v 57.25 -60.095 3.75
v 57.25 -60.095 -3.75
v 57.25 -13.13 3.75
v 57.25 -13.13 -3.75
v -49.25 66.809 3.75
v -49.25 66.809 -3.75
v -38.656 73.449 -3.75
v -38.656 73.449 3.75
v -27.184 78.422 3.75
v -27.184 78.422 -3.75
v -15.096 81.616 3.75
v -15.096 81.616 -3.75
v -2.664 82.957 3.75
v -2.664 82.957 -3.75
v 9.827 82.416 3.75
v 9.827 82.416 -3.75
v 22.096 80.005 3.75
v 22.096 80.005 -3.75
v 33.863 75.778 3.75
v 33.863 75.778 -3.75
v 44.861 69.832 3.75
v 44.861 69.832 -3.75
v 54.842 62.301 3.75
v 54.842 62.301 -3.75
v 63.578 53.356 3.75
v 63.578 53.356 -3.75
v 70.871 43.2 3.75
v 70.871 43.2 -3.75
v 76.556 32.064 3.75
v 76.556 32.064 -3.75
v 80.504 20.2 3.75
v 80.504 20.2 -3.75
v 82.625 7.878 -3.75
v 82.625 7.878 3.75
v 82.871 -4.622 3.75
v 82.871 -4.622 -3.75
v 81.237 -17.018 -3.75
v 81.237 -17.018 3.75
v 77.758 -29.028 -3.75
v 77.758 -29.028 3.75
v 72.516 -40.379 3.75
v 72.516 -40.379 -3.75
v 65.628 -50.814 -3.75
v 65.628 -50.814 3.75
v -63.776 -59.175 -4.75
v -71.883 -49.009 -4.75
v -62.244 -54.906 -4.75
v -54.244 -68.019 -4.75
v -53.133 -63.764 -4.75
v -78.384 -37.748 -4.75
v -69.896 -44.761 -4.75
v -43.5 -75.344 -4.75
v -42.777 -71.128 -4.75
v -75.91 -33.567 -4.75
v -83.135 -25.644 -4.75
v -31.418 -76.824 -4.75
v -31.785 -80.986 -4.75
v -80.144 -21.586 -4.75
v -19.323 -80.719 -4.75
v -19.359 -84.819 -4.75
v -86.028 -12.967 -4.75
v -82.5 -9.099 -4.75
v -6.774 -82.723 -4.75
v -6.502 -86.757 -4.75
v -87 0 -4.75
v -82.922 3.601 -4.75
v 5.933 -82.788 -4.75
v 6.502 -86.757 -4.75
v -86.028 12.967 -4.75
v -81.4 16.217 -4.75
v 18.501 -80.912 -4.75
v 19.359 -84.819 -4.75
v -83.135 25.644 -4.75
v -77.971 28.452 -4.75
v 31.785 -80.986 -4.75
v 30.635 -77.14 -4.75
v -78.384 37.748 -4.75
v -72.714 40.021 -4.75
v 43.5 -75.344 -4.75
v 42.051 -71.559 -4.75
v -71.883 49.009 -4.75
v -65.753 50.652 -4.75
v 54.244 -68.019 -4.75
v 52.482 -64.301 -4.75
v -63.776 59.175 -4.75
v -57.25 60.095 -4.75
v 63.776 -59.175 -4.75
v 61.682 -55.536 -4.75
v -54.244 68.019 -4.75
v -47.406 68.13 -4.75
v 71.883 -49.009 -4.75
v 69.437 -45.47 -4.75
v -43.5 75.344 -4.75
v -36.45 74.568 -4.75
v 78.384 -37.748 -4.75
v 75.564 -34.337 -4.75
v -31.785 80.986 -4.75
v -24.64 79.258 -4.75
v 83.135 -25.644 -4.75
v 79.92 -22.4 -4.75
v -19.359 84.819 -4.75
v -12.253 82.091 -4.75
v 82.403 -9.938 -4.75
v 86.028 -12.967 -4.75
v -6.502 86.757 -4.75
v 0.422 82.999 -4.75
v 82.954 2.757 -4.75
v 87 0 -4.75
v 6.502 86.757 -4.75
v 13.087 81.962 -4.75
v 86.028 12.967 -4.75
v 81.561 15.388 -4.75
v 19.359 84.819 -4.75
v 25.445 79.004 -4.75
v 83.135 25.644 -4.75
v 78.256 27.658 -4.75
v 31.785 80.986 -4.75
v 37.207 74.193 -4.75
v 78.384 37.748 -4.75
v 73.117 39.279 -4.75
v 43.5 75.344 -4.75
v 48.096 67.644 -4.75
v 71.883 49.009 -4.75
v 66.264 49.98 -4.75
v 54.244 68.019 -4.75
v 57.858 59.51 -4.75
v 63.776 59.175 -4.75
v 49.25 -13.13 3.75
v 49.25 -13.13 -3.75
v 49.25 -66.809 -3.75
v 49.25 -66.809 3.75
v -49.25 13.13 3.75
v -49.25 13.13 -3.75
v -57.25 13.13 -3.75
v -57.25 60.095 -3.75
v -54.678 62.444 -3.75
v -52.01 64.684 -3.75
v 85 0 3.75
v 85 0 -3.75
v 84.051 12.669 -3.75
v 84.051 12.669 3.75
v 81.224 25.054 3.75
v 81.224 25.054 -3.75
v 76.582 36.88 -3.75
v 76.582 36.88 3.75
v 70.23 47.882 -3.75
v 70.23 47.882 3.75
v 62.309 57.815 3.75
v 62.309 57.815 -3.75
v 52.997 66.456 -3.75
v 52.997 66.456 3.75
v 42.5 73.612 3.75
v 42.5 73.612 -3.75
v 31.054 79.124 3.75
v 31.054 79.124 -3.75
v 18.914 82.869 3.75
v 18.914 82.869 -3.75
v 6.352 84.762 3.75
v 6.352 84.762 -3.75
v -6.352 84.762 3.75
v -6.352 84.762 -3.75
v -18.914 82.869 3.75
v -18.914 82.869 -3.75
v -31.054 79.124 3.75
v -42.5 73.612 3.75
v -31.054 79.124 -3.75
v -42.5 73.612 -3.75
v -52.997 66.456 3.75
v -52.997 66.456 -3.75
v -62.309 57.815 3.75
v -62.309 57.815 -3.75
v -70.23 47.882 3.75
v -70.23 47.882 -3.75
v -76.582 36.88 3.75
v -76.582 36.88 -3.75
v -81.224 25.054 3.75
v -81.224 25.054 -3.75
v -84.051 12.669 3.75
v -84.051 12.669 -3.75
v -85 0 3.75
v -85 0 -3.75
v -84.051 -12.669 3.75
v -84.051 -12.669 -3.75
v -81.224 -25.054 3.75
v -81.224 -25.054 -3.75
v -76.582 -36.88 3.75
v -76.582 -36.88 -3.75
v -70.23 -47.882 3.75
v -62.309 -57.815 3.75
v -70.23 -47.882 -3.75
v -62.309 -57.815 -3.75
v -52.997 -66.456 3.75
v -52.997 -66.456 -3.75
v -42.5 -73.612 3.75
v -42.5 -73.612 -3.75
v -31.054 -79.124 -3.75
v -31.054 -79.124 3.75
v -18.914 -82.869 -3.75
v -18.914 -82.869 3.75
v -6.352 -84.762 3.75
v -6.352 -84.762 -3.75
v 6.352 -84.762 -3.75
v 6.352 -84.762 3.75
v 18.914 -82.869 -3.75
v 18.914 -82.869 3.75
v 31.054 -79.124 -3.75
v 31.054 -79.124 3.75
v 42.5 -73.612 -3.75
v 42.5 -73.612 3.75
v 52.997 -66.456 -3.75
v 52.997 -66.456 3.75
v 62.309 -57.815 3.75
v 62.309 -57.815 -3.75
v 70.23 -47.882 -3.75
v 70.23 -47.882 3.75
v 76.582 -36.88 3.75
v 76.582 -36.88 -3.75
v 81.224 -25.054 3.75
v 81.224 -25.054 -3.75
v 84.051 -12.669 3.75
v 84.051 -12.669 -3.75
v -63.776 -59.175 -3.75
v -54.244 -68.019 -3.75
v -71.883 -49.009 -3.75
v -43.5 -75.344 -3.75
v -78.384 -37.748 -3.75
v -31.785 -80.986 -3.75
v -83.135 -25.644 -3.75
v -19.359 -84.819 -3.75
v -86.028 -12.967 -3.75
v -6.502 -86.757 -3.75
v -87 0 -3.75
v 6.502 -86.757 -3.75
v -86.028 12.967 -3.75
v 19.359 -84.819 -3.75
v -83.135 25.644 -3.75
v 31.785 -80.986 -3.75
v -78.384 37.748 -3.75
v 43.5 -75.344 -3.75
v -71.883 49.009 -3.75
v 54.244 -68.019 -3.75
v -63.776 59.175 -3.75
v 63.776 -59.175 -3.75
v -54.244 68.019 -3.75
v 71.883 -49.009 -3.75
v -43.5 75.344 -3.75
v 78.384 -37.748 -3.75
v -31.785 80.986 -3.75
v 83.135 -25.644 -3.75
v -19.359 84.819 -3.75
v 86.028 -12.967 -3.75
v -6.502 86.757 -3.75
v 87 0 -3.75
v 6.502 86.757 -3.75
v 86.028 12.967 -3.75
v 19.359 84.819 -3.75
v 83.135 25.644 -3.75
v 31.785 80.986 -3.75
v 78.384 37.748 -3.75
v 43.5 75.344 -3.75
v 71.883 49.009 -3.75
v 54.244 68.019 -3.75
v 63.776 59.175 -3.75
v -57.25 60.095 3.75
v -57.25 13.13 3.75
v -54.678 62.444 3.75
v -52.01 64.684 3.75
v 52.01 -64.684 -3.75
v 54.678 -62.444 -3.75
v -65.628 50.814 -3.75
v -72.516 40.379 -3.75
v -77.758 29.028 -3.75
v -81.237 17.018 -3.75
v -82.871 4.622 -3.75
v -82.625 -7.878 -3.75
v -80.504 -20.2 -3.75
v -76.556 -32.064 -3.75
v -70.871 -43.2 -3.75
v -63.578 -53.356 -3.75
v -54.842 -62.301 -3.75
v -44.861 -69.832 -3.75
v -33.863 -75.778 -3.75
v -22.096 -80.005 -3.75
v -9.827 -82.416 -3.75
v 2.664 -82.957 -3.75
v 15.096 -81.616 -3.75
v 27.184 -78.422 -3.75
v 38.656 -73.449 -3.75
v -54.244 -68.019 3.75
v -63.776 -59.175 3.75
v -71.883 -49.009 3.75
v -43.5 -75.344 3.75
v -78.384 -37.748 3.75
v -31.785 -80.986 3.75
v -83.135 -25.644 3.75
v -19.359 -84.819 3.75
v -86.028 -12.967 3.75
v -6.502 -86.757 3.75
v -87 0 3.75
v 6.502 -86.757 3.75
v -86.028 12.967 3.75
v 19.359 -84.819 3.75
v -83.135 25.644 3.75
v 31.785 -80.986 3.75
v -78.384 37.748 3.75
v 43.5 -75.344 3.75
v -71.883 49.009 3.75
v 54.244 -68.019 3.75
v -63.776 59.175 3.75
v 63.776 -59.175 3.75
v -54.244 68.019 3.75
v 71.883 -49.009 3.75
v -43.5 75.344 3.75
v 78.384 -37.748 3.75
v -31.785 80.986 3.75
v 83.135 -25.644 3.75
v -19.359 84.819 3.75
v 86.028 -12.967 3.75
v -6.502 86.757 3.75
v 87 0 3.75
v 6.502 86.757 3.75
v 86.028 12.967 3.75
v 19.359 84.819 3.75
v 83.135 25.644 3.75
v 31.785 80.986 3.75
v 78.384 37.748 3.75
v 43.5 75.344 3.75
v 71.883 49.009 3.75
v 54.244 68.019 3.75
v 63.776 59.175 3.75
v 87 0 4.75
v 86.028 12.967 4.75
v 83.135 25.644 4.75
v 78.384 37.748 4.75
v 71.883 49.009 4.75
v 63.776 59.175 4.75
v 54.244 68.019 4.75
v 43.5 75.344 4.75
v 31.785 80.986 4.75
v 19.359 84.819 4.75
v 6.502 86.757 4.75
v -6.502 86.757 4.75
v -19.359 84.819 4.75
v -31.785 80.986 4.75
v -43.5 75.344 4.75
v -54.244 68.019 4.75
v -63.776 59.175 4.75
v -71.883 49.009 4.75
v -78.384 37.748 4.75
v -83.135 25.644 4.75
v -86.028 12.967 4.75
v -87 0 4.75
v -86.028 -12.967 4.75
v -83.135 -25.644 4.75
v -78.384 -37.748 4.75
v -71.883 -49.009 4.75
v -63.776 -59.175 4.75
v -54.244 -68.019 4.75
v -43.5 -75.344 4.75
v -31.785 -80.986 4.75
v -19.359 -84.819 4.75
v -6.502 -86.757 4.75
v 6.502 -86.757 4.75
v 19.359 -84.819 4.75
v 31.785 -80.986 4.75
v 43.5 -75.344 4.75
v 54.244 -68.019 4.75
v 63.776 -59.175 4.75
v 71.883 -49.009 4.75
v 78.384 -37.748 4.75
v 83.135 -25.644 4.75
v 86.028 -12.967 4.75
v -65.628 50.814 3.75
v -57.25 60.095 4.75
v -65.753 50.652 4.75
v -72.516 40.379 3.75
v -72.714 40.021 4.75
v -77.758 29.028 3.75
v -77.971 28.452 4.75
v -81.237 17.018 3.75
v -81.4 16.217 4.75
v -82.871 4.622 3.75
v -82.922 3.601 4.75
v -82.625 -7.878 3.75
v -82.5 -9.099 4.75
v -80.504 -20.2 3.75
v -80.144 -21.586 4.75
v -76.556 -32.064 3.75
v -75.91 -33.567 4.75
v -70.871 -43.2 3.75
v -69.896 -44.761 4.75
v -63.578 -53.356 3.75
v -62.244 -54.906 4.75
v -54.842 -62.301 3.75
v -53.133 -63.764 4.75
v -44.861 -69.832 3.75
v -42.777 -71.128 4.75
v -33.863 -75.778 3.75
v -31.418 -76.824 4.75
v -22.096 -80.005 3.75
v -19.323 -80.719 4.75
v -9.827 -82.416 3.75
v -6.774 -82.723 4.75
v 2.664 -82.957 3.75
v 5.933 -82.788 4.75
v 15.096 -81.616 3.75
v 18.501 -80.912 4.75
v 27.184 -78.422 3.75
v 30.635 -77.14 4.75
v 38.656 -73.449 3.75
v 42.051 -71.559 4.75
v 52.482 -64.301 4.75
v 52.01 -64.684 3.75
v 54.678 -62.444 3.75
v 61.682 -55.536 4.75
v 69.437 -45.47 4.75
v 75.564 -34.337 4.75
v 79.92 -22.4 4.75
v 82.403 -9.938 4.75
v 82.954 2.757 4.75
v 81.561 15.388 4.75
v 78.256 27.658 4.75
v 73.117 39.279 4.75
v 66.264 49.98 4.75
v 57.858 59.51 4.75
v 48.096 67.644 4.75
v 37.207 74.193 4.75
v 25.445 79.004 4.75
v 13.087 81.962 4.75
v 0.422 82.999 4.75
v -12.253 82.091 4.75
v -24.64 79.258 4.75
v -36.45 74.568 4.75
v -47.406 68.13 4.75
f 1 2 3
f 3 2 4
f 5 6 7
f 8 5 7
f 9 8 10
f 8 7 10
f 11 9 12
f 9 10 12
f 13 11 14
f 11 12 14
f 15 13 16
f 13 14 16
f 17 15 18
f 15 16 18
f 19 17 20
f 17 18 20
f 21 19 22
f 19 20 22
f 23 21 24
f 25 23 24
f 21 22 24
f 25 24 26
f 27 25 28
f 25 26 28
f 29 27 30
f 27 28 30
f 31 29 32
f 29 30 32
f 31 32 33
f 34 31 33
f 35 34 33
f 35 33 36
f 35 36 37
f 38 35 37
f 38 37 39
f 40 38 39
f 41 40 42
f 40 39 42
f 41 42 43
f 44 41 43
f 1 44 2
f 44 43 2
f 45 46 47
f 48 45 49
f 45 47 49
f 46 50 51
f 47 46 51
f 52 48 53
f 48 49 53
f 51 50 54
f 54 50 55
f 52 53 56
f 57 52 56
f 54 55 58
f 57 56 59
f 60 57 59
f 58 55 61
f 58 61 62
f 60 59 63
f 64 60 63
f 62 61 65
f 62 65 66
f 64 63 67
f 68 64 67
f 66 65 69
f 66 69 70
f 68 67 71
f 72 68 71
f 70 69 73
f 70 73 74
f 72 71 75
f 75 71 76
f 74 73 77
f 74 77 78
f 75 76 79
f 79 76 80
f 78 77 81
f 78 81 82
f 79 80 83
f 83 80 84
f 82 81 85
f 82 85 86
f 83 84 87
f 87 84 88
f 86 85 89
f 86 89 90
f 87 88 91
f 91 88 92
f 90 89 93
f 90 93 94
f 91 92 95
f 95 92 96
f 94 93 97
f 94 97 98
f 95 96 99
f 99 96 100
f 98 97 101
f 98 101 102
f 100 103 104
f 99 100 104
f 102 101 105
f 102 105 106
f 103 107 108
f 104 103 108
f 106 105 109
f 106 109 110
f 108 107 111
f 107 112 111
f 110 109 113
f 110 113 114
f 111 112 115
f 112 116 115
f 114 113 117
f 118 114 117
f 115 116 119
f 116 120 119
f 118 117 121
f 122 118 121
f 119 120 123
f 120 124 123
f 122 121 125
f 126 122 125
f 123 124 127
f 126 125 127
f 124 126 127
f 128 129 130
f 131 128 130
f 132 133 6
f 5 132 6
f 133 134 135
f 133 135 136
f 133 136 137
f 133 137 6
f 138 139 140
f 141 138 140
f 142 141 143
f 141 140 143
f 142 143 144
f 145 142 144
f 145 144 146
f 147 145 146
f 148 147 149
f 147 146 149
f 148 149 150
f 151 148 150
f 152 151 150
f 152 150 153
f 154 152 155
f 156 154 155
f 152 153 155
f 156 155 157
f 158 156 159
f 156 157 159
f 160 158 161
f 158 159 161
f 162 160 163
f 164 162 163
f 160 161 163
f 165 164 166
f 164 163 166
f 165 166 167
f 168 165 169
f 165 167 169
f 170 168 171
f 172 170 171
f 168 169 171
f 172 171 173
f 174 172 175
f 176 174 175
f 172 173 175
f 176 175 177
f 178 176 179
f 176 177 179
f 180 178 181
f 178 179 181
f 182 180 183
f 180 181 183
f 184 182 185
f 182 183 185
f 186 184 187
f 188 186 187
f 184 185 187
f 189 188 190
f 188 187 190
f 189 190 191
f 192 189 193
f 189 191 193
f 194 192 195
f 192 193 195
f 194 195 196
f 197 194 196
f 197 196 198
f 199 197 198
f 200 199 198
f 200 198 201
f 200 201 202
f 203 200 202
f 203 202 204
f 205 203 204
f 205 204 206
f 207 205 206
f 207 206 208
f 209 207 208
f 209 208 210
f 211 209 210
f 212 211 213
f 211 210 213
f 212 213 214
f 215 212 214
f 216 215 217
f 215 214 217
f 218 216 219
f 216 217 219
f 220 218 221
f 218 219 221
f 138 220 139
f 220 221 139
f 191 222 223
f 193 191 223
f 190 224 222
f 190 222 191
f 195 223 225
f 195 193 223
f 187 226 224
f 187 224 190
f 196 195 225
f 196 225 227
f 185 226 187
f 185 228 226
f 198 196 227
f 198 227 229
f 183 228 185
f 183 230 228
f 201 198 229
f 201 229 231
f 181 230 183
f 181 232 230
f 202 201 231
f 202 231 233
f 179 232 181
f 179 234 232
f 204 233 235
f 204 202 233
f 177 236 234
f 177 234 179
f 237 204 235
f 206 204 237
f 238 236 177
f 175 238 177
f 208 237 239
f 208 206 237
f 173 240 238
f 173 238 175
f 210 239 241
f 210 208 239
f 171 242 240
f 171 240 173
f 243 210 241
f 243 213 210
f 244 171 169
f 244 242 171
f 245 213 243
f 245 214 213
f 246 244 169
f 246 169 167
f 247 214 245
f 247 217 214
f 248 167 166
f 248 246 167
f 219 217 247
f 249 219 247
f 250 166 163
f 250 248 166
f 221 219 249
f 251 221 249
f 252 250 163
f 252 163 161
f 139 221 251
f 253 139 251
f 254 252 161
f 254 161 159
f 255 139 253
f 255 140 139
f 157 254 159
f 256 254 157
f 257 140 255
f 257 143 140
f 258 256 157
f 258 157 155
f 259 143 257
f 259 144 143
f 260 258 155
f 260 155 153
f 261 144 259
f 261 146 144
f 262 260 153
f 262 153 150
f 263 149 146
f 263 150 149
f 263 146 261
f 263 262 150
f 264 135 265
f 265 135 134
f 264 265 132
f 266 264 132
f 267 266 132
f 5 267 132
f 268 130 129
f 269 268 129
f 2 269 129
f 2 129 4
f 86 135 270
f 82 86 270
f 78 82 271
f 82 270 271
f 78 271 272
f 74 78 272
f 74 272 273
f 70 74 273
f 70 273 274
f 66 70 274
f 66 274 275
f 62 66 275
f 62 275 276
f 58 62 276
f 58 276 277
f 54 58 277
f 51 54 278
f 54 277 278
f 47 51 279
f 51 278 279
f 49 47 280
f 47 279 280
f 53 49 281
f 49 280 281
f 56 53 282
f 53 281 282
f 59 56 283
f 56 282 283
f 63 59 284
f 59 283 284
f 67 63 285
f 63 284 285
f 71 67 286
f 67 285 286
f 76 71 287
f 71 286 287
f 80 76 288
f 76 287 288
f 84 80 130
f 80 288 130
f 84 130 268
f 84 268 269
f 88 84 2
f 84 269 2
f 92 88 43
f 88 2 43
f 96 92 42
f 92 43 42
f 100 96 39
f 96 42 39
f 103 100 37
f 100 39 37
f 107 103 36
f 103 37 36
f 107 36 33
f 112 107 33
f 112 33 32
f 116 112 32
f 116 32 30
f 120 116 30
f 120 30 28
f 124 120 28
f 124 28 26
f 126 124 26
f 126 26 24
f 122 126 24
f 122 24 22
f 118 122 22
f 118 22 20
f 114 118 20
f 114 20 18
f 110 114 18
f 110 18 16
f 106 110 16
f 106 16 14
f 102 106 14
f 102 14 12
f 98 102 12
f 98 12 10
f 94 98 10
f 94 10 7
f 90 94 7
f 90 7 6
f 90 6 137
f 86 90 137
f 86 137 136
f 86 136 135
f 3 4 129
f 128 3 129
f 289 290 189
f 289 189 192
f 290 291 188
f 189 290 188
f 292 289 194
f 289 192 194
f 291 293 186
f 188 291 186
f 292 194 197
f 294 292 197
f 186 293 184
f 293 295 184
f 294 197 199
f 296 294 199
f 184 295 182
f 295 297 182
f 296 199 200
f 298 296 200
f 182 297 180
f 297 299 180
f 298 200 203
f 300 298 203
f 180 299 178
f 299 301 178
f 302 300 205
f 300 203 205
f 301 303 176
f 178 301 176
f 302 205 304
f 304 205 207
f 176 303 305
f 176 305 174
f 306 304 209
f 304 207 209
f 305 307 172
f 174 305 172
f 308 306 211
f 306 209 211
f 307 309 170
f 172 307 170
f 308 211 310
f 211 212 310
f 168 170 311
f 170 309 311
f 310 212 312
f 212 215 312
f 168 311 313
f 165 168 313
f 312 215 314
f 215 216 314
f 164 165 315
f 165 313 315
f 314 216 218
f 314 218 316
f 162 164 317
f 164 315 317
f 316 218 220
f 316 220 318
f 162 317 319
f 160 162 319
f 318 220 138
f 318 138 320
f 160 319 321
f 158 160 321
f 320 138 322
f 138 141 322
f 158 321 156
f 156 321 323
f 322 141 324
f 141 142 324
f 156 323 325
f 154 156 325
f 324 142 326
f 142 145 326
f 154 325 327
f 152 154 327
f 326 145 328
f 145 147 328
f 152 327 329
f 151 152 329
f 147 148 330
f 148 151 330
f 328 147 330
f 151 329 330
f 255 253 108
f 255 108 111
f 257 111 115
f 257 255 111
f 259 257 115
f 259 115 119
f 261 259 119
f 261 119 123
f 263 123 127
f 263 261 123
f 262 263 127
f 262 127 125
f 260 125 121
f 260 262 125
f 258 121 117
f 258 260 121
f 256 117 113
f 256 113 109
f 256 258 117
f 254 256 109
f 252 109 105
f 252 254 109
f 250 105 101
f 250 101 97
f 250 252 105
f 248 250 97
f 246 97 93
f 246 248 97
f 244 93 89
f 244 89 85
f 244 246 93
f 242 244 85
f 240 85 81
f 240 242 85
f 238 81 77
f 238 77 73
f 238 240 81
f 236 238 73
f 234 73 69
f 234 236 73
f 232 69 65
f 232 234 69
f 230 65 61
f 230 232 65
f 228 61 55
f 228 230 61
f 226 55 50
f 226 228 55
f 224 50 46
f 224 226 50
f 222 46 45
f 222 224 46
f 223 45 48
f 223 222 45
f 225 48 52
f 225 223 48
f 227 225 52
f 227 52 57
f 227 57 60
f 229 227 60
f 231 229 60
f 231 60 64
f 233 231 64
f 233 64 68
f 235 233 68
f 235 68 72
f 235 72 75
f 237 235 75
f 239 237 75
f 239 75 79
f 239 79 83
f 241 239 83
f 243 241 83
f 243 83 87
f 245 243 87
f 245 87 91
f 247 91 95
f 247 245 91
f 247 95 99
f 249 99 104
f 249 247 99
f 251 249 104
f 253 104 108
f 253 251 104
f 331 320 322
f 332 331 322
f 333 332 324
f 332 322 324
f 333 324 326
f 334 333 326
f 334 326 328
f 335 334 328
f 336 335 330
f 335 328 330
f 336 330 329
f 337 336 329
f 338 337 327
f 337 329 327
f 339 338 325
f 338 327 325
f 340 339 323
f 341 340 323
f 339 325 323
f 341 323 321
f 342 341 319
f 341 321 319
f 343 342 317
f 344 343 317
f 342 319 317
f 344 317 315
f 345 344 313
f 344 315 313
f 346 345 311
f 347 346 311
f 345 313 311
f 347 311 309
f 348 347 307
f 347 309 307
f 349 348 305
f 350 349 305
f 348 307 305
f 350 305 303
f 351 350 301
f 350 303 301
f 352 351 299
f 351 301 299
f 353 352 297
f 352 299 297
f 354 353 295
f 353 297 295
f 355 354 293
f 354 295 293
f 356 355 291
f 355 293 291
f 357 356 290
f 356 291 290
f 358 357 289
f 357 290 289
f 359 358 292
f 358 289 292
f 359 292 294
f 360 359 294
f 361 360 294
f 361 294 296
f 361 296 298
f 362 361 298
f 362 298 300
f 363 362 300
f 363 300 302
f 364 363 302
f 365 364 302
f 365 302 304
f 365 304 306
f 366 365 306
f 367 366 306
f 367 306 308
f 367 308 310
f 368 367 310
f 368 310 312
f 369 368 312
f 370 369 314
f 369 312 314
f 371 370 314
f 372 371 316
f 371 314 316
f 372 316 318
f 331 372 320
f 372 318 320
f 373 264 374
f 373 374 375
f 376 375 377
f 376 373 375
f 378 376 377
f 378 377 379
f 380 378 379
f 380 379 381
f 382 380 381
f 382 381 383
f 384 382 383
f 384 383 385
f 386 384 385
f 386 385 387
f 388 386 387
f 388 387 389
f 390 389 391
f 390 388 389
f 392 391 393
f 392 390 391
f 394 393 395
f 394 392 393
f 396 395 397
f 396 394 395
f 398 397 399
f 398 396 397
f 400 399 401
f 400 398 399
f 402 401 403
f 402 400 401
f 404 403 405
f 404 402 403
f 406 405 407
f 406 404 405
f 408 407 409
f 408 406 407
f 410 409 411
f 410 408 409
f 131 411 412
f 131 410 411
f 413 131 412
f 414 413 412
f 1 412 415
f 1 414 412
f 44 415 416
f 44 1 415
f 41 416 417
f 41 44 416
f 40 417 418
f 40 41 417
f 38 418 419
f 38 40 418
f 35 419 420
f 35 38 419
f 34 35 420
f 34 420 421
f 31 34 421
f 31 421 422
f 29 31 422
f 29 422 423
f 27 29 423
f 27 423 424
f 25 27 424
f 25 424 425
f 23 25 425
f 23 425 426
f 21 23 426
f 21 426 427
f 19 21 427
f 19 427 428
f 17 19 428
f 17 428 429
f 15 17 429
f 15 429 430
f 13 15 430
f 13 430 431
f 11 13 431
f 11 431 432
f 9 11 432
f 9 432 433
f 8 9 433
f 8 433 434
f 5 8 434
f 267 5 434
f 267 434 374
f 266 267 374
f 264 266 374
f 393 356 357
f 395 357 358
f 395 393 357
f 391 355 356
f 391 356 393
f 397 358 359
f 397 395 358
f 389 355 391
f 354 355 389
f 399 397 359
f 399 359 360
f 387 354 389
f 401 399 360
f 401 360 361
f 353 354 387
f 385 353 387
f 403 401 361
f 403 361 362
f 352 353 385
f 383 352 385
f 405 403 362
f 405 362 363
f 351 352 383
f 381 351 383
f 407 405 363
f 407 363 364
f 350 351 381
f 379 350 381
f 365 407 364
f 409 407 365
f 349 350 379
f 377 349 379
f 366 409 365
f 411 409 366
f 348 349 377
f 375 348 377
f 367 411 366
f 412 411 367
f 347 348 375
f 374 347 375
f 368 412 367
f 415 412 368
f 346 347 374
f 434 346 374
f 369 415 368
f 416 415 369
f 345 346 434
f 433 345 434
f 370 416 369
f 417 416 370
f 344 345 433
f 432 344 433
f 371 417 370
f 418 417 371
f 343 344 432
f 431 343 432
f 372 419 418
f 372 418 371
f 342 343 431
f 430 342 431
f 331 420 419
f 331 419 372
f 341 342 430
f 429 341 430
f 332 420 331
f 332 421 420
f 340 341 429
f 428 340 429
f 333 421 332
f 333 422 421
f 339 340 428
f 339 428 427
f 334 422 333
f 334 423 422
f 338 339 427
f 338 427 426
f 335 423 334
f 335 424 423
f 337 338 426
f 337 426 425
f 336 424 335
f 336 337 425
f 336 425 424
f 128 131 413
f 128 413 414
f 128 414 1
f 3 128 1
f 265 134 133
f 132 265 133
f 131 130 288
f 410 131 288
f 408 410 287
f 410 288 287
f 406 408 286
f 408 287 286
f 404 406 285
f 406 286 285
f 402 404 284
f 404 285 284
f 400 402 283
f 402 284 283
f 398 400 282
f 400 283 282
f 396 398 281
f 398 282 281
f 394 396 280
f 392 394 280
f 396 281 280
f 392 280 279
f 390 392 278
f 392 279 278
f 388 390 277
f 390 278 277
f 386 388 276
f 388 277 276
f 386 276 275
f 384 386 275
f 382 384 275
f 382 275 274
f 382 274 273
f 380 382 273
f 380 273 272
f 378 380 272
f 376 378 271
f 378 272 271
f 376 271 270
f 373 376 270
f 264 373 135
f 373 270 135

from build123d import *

# Parameters (mm, degrees)
TRACK_START     = -3.75
TRACK_OUTLINE_R = 85
TRACK_DEPTH     = 7.5
SKETCH2_R       = 87
SKETCH2_R_2     = 83
RAIL_DEPTH      = 1


# Read off the part's stored shape, not the designer's step: Track
with BuildPart() as part:
    # Track outline → Track (new body)
    with BuildSketch(Plane.XY.offset(TRACK_START)):
        Circle(TRACK_OUTLINE_R)
        with BuildLine():
            Line((57.25, -60.095236916), (57.25, -13.13))
            Line((57.25, -13.13), (49.25, -13.13))
            Line((49.25, -13.13), (49.25, -66.808962722))
            ThreePointArc((49.25, -66.808962722), (-63.578054165, -53.355702868), (-57.25, 60.095236916))
            Line((-57.25, 60.095236916), (-57.25, 13.13))
            Line((-57.25, 13.13), (-49.25, 13.13))
            Line((-49.25, 13.13), (-49.25, 66.808962722))
            ThreePointArc((-49.25, 66.808962722), (63.578054165, 53.355702868), (57.25, -60.095236916))
        make_face(mode=Mode.SUBTRACT)
    extrude(amount=TRACK_DEPTH)

    # Sketch2 → Rail (add)
    with BuildSketch(Plane.XY.offset(3.75)):
        Circle(SKETCH2_R)
        with Locations(Location((0, 0, 0), (0, 0, 133.611037517))):
            Circle(SKETCH2_R_2, mode=Mode.SUBTRACT)
    rail = extrude(amount=RAIL_DEPTH)

    # Mirror1: Rail across plane
    add(rail.mirror(Plane.XY))


solid = part.part
